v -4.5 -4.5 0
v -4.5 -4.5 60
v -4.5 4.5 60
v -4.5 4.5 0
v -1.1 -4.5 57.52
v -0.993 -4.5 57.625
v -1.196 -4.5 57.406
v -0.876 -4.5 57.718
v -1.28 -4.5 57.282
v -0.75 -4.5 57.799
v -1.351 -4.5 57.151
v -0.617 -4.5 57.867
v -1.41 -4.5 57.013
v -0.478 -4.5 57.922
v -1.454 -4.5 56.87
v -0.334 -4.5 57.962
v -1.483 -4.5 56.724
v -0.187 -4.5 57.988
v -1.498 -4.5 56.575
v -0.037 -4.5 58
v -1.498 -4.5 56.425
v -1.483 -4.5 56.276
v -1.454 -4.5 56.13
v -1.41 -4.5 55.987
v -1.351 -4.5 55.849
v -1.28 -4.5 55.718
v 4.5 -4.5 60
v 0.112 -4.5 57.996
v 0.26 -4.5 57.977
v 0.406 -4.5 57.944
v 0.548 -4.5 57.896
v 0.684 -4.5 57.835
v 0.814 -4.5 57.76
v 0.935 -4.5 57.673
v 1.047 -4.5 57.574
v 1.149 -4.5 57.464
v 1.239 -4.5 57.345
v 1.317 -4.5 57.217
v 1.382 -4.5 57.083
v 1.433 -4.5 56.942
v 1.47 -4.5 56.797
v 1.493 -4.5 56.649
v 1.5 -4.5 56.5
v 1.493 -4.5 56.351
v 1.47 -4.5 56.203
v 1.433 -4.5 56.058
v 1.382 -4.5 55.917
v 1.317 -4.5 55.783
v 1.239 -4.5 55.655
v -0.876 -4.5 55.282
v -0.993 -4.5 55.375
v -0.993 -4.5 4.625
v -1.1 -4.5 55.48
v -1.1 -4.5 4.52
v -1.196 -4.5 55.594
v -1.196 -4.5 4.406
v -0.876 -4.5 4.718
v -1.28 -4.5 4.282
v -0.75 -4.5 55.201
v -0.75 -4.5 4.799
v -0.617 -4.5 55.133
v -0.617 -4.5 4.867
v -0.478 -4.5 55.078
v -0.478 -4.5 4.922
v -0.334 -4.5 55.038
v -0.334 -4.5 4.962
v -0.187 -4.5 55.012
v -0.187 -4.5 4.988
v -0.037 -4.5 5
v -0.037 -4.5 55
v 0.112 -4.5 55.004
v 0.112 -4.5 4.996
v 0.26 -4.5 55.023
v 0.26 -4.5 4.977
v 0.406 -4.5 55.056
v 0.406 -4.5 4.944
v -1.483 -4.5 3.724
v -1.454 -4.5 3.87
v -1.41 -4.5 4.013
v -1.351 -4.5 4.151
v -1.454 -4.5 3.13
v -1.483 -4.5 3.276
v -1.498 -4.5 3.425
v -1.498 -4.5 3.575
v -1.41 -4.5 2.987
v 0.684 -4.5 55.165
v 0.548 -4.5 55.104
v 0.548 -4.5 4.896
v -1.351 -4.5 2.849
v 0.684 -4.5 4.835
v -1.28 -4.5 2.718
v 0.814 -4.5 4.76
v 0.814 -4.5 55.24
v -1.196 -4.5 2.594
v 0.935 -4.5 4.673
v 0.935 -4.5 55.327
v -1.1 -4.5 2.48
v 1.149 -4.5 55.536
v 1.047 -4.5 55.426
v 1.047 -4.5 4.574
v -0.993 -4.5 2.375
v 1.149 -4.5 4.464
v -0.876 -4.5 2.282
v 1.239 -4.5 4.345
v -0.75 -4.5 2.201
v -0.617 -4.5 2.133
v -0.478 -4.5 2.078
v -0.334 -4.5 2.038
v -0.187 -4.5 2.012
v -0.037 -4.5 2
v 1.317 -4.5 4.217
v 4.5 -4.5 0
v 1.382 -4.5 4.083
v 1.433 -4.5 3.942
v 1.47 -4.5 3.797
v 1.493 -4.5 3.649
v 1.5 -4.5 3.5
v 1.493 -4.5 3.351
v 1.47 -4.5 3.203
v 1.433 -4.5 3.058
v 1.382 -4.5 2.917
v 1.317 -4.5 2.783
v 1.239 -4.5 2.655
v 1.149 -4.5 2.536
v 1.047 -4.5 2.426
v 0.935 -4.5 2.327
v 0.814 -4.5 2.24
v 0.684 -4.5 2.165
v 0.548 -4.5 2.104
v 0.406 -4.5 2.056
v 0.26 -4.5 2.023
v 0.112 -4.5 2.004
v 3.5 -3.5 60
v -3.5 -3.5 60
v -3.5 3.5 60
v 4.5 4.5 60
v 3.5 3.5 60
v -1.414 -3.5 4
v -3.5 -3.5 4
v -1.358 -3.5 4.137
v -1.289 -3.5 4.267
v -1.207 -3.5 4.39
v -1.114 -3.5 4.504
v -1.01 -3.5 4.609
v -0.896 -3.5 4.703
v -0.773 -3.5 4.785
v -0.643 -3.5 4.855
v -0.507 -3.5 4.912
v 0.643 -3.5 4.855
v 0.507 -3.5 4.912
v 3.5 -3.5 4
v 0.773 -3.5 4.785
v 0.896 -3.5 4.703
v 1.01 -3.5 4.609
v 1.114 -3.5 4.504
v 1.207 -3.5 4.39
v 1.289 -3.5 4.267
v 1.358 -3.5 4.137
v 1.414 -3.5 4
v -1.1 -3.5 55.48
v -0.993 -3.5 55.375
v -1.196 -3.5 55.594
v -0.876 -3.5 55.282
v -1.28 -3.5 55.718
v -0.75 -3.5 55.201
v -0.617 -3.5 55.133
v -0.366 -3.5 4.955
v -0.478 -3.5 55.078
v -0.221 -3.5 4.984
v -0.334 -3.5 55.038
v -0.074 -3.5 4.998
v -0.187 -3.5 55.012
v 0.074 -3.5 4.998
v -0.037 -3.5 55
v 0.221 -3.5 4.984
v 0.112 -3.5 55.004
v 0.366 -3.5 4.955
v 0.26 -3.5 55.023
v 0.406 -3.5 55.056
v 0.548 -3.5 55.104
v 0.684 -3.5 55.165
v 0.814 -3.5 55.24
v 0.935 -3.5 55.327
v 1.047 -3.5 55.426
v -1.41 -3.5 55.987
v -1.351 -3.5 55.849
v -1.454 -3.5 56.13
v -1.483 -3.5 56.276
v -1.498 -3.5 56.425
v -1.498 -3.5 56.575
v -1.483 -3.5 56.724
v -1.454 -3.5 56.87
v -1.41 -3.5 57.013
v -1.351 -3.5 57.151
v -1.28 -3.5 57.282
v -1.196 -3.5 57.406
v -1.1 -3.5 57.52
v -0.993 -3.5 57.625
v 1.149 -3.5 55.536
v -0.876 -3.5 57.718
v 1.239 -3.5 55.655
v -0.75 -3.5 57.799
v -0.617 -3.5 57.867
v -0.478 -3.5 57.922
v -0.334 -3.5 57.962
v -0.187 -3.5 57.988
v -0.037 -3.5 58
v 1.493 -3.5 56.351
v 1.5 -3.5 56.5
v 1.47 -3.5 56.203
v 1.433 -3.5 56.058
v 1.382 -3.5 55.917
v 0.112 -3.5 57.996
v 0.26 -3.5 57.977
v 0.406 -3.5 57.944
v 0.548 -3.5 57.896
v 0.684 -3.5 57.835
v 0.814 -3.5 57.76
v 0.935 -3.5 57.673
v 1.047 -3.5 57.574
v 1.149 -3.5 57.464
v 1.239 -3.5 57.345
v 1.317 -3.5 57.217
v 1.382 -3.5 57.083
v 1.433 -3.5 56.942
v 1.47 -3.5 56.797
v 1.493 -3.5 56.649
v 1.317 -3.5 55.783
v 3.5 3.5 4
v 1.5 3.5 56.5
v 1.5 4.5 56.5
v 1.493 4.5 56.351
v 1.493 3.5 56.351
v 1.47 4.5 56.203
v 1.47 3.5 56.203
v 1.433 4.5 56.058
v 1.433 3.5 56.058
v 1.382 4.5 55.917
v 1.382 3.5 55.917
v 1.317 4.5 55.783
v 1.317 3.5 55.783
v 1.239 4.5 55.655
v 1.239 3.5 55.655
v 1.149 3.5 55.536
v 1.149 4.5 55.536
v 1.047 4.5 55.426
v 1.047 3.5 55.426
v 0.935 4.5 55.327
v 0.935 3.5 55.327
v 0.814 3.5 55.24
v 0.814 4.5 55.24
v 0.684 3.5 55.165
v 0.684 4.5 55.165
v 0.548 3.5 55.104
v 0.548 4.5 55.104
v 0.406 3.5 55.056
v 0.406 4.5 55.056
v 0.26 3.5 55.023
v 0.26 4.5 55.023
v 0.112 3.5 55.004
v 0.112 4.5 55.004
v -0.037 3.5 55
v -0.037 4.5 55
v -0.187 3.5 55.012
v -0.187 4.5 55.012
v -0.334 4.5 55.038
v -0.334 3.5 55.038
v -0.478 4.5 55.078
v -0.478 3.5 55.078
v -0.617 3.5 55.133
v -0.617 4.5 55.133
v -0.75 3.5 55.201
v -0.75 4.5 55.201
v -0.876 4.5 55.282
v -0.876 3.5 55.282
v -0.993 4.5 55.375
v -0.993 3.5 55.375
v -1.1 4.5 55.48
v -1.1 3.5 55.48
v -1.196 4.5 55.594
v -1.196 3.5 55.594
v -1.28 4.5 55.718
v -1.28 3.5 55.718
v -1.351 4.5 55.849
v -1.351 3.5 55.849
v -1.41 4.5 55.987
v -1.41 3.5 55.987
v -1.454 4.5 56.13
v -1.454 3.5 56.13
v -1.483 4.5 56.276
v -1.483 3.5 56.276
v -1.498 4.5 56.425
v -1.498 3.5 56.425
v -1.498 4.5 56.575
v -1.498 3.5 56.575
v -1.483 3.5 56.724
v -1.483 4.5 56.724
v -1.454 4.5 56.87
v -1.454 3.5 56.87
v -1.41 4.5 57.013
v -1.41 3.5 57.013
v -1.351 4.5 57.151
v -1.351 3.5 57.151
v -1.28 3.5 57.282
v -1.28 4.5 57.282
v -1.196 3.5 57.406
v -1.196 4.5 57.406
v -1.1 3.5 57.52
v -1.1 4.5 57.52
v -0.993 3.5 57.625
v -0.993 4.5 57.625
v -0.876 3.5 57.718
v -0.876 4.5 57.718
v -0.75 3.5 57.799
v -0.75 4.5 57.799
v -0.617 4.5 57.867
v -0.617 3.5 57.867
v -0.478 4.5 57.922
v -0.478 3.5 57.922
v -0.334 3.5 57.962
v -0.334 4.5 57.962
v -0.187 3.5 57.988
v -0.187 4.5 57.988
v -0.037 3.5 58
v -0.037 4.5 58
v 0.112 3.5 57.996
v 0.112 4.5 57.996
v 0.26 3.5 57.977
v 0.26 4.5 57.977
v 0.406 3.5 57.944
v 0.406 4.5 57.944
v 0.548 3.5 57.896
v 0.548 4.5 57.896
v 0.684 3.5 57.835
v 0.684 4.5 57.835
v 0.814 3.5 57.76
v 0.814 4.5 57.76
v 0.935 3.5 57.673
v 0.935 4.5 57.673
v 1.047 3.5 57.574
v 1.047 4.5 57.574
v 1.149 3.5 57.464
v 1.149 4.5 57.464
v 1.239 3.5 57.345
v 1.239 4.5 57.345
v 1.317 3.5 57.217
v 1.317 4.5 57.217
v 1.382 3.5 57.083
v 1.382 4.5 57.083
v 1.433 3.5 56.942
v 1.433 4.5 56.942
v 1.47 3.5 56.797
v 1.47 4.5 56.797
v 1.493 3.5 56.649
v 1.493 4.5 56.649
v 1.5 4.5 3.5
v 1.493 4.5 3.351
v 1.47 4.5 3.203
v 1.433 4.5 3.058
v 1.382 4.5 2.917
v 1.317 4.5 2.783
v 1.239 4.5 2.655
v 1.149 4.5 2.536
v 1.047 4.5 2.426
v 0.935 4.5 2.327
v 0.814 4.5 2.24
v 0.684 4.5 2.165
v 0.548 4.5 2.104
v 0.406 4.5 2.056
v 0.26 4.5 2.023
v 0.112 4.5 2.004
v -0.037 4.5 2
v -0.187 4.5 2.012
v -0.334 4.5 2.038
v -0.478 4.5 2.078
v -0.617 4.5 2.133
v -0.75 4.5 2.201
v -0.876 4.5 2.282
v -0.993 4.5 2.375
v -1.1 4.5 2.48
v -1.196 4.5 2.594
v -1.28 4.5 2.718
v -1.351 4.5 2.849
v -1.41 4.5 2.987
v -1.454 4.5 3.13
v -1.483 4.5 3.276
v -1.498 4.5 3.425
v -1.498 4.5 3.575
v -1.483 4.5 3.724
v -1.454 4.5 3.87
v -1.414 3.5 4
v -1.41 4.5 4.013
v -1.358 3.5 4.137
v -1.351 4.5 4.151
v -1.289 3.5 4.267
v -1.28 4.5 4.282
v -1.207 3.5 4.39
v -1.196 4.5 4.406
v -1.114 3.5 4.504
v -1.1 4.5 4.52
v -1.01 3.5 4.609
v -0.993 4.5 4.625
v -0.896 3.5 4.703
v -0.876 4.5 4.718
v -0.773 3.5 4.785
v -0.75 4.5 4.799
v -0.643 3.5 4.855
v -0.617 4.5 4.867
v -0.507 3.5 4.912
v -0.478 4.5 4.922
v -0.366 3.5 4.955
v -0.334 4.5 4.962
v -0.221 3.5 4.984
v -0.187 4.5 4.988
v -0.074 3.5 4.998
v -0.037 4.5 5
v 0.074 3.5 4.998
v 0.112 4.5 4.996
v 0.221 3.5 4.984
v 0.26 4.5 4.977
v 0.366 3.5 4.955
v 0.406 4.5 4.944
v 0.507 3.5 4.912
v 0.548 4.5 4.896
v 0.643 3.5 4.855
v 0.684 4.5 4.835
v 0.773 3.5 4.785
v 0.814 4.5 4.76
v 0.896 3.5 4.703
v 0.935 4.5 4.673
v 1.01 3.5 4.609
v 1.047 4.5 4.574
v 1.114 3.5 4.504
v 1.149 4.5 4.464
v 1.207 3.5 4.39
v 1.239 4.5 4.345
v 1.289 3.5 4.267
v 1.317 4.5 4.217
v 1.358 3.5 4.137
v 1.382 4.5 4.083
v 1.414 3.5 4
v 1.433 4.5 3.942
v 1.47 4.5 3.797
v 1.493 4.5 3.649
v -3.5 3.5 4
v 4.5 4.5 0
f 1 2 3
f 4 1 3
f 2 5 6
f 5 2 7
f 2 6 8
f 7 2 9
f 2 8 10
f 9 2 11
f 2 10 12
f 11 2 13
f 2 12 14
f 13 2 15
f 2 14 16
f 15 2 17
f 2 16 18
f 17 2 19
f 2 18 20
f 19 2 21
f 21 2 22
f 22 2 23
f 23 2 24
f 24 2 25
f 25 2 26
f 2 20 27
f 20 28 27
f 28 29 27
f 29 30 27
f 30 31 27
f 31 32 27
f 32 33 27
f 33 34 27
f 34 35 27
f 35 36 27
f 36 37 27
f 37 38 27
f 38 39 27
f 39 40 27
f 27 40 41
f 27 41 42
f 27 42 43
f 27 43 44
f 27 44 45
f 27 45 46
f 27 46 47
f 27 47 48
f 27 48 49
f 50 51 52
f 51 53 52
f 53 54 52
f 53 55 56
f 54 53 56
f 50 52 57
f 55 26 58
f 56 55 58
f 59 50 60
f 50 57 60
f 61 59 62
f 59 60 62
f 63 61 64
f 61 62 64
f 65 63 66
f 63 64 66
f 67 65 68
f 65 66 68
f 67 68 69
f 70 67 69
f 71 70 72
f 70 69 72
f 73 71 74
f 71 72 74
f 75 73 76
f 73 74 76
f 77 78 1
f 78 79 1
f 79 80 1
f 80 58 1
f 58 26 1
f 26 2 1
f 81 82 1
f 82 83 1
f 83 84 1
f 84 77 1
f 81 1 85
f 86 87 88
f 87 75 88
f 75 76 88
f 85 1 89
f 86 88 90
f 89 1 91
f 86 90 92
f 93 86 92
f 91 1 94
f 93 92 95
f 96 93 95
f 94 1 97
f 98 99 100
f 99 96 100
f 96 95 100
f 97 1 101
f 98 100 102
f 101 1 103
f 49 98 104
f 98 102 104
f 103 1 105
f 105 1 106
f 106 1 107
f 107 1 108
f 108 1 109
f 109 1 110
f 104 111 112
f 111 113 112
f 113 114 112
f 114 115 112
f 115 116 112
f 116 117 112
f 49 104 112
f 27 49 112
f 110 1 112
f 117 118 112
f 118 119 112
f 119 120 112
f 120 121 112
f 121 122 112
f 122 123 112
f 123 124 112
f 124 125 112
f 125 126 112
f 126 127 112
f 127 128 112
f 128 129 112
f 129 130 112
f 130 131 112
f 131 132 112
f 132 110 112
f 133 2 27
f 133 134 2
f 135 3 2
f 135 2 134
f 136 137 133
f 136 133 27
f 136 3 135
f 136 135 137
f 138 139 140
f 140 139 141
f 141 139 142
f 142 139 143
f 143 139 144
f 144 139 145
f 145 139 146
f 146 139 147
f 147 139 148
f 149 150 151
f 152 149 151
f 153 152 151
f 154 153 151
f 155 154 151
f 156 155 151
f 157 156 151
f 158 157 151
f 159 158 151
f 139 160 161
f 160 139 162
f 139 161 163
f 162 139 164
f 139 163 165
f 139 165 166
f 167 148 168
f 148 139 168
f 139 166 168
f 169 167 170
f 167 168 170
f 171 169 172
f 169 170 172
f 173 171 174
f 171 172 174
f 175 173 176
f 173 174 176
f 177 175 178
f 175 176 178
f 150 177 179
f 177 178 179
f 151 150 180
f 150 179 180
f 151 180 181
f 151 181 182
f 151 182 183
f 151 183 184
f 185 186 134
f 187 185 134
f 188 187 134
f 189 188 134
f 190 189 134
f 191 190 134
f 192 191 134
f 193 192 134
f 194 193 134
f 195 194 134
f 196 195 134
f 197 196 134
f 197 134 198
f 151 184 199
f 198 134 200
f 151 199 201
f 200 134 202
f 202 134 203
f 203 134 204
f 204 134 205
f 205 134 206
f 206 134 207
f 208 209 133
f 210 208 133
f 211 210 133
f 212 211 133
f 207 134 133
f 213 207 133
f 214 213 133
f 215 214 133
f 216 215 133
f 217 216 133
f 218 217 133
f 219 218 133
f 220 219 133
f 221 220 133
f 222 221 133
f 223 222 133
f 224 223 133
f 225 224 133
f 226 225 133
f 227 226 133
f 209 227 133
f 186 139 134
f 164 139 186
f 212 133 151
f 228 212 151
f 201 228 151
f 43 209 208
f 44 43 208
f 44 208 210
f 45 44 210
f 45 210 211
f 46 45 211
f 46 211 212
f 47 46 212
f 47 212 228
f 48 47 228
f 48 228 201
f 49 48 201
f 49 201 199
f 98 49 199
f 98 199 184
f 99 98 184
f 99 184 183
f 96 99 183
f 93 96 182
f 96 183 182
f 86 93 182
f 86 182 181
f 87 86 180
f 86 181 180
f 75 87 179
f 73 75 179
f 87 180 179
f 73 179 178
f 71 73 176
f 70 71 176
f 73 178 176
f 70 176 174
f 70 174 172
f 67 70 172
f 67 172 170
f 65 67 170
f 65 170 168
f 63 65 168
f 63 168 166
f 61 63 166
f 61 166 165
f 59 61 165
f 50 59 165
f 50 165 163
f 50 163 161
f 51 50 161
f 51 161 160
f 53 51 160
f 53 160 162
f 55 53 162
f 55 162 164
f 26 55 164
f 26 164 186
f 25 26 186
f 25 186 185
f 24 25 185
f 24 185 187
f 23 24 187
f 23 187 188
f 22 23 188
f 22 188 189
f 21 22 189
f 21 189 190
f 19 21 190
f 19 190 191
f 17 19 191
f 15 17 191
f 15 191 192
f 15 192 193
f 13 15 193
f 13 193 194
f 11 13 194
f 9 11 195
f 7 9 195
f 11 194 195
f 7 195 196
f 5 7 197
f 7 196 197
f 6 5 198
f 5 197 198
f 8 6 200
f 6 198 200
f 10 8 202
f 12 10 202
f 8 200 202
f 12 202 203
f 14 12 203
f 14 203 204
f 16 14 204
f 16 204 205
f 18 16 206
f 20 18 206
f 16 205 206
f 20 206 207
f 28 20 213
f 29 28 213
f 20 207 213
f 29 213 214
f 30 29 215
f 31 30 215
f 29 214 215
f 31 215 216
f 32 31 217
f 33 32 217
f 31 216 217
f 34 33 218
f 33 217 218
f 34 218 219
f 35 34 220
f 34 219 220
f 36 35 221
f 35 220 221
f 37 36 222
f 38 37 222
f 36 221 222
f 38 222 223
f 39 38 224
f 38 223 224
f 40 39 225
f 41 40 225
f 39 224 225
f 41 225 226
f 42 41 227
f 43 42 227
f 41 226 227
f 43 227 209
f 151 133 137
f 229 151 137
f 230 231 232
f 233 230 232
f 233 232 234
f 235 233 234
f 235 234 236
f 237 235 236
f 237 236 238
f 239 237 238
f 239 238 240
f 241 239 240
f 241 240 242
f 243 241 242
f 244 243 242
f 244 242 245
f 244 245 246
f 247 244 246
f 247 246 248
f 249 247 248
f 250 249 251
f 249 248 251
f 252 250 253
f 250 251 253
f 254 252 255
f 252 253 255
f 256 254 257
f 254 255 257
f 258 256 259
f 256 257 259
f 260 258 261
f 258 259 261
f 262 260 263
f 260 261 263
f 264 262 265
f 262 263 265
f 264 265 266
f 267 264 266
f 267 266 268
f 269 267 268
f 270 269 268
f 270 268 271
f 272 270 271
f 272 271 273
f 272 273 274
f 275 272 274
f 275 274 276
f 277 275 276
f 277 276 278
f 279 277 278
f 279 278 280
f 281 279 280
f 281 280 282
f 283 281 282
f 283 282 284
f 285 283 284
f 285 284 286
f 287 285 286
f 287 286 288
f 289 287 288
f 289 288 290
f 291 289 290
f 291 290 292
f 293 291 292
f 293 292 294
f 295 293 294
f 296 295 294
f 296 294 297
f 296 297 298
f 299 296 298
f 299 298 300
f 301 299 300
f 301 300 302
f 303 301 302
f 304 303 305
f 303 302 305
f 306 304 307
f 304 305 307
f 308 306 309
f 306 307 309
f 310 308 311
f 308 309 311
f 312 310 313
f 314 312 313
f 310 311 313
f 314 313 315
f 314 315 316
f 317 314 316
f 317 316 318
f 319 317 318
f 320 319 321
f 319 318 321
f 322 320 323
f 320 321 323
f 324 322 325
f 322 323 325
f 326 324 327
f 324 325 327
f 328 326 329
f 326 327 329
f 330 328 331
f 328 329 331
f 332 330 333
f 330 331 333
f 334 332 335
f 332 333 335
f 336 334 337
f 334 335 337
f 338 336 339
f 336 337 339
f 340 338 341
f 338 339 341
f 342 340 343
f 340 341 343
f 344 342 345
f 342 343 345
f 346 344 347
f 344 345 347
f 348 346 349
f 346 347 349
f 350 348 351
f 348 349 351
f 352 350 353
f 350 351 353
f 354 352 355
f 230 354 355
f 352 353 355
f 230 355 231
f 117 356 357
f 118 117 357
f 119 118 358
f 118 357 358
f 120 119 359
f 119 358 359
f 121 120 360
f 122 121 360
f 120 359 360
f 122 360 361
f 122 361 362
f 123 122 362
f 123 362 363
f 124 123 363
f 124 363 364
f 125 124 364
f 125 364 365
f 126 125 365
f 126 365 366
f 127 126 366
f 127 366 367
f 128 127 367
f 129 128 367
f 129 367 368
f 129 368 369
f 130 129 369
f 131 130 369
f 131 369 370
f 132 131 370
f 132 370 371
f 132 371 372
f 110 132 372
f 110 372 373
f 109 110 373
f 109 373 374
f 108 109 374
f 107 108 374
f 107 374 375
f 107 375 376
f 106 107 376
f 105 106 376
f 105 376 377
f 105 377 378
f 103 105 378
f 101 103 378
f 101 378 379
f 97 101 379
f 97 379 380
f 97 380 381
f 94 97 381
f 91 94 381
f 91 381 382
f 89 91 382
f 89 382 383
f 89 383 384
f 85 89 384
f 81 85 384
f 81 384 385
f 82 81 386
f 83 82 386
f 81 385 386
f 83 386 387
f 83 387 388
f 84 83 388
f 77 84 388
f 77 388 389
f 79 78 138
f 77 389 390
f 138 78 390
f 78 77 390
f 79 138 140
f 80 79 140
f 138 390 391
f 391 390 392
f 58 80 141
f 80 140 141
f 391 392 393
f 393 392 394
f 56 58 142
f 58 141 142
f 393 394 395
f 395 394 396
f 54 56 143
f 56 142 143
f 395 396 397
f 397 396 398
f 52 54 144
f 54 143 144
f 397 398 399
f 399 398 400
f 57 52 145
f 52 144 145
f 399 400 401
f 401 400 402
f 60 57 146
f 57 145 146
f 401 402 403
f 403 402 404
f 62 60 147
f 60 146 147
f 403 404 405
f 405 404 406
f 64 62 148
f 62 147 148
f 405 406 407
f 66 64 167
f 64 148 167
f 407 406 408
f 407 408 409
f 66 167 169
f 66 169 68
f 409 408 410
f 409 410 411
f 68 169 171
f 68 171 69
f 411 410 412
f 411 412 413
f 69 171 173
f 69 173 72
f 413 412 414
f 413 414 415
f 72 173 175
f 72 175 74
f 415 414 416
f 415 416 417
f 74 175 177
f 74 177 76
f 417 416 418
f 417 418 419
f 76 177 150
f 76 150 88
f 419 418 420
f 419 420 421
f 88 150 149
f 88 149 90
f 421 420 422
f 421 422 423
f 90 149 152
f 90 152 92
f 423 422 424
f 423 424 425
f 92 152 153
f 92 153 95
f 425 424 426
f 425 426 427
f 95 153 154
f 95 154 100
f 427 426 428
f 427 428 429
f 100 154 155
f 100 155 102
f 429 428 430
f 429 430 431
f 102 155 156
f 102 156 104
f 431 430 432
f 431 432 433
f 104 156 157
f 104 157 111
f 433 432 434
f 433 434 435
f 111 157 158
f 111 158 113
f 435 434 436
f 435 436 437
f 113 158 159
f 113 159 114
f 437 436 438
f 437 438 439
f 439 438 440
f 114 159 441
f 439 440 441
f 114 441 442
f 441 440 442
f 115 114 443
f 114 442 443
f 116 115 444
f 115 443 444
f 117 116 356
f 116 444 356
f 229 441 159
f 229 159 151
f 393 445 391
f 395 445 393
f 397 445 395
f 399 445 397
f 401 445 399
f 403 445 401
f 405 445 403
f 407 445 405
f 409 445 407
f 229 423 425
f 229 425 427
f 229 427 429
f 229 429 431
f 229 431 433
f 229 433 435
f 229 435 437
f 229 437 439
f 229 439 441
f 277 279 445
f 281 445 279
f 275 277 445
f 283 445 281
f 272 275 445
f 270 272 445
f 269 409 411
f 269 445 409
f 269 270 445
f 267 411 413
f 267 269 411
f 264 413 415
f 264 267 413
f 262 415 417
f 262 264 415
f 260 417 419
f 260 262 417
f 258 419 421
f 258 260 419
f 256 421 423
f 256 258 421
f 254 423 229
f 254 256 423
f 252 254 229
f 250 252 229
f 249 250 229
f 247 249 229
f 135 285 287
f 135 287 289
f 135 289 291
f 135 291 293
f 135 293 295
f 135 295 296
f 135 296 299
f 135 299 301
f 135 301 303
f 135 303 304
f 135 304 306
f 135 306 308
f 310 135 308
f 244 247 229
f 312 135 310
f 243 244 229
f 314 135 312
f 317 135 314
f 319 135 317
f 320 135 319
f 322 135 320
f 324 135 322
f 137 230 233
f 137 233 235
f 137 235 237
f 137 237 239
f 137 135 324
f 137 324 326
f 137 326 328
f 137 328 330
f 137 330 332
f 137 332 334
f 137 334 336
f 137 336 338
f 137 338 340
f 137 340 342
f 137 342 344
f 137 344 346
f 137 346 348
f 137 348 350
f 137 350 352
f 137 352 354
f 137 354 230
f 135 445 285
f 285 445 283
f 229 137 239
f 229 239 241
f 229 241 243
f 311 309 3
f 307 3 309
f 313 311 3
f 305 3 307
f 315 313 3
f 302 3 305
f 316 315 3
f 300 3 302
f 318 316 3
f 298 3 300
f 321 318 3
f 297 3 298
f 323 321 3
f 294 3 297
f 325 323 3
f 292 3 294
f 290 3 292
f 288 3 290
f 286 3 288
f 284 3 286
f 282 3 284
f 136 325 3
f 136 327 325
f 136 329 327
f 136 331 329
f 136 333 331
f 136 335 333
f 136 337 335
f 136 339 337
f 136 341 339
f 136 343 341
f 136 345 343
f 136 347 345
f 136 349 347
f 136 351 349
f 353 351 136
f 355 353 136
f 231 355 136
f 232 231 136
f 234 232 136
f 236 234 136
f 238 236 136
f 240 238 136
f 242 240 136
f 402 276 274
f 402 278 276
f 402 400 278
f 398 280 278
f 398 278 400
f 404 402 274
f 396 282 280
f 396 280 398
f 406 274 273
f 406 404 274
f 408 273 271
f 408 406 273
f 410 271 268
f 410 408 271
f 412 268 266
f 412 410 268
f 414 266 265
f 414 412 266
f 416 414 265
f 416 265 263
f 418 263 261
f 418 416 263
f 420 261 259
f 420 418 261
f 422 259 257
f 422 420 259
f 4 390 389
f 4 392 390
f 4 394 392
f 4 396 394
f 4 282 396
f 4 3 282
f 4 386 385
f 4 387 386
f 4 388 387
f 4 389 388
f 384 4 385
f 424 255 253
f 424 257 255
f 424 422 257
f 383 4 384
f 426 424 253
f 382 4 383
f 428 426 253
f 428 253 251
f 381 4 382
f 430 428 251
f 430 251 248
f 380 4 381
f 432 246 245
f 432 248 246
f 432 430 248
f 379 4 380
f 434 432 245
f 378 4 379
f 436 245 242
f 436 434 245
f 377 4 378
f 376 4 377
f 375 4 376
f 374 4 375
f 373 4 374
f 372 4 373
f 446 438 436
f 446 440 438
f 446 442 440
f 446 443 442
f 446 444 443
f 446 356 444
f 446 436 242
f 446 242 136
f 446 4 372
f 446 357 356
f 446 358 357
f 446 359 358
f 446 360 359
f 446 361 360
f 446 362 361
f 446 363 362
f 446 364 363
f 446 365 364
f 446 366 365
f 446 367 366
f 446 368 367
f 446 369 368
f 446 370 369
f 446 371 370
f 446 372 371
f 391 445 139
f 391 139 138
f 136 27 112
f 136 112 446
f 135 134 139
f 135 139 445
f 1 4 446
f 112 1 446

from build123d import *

# Parameters (mm, degrees)
SKETCH_1_W          = 9
SKETCH_1_H          = 9
EXTRUDE_1_DEPTH     = 60
SKETCH_2_W          = 7
SKETCH_2_H          = 7
CUT_EXTRUDE_1_DEPTH = 56
SKETCH_3_R          = 1.5
CUT_EXTRUDE_2_DEPTH = 56


with BuildPart() as part:
    # ｽｹｯﾁ1 → ﾎﾞｽ - 押し出し1 (new body)
    with BuildSketch(Plane.XY):
        Rectangle(SKETCH_1_W, SKETCH_1_H)
    extrude(amount=EXTRUDE_1_DEPTH)

    # ｽｹｯﾁ2 → ｶｯﾄ - 押し出し1 (cut)
    with BuildSketch(Plane.XY.offset(60)):
        Rectangle(SKETCH_2_W, SKETCH_2_H)
    extrude(amount=-CUT_EXTRUDE_1_DEPTH, mode=Mode.SUBTRACT)

    # ｽｹｯﾁ3 → ｶｯﾄ - 押し出し2 (cut)
    with BuildSketch(Plane(origin=(0, 4.5, 0), x_dir=(1, 0, 0), z_dir=(0, 1, 0))):
        with Locations((0, -3.5)):
            Circle(SKETCH_3_R)
        with Locations((0, -56.5)):
            Circle(SKETCH_3_R)
    extrude(amount=-CUT_EXTRUDE_2_DEPTH, mode=Mode.SUBTRACT)


solid = part.part
